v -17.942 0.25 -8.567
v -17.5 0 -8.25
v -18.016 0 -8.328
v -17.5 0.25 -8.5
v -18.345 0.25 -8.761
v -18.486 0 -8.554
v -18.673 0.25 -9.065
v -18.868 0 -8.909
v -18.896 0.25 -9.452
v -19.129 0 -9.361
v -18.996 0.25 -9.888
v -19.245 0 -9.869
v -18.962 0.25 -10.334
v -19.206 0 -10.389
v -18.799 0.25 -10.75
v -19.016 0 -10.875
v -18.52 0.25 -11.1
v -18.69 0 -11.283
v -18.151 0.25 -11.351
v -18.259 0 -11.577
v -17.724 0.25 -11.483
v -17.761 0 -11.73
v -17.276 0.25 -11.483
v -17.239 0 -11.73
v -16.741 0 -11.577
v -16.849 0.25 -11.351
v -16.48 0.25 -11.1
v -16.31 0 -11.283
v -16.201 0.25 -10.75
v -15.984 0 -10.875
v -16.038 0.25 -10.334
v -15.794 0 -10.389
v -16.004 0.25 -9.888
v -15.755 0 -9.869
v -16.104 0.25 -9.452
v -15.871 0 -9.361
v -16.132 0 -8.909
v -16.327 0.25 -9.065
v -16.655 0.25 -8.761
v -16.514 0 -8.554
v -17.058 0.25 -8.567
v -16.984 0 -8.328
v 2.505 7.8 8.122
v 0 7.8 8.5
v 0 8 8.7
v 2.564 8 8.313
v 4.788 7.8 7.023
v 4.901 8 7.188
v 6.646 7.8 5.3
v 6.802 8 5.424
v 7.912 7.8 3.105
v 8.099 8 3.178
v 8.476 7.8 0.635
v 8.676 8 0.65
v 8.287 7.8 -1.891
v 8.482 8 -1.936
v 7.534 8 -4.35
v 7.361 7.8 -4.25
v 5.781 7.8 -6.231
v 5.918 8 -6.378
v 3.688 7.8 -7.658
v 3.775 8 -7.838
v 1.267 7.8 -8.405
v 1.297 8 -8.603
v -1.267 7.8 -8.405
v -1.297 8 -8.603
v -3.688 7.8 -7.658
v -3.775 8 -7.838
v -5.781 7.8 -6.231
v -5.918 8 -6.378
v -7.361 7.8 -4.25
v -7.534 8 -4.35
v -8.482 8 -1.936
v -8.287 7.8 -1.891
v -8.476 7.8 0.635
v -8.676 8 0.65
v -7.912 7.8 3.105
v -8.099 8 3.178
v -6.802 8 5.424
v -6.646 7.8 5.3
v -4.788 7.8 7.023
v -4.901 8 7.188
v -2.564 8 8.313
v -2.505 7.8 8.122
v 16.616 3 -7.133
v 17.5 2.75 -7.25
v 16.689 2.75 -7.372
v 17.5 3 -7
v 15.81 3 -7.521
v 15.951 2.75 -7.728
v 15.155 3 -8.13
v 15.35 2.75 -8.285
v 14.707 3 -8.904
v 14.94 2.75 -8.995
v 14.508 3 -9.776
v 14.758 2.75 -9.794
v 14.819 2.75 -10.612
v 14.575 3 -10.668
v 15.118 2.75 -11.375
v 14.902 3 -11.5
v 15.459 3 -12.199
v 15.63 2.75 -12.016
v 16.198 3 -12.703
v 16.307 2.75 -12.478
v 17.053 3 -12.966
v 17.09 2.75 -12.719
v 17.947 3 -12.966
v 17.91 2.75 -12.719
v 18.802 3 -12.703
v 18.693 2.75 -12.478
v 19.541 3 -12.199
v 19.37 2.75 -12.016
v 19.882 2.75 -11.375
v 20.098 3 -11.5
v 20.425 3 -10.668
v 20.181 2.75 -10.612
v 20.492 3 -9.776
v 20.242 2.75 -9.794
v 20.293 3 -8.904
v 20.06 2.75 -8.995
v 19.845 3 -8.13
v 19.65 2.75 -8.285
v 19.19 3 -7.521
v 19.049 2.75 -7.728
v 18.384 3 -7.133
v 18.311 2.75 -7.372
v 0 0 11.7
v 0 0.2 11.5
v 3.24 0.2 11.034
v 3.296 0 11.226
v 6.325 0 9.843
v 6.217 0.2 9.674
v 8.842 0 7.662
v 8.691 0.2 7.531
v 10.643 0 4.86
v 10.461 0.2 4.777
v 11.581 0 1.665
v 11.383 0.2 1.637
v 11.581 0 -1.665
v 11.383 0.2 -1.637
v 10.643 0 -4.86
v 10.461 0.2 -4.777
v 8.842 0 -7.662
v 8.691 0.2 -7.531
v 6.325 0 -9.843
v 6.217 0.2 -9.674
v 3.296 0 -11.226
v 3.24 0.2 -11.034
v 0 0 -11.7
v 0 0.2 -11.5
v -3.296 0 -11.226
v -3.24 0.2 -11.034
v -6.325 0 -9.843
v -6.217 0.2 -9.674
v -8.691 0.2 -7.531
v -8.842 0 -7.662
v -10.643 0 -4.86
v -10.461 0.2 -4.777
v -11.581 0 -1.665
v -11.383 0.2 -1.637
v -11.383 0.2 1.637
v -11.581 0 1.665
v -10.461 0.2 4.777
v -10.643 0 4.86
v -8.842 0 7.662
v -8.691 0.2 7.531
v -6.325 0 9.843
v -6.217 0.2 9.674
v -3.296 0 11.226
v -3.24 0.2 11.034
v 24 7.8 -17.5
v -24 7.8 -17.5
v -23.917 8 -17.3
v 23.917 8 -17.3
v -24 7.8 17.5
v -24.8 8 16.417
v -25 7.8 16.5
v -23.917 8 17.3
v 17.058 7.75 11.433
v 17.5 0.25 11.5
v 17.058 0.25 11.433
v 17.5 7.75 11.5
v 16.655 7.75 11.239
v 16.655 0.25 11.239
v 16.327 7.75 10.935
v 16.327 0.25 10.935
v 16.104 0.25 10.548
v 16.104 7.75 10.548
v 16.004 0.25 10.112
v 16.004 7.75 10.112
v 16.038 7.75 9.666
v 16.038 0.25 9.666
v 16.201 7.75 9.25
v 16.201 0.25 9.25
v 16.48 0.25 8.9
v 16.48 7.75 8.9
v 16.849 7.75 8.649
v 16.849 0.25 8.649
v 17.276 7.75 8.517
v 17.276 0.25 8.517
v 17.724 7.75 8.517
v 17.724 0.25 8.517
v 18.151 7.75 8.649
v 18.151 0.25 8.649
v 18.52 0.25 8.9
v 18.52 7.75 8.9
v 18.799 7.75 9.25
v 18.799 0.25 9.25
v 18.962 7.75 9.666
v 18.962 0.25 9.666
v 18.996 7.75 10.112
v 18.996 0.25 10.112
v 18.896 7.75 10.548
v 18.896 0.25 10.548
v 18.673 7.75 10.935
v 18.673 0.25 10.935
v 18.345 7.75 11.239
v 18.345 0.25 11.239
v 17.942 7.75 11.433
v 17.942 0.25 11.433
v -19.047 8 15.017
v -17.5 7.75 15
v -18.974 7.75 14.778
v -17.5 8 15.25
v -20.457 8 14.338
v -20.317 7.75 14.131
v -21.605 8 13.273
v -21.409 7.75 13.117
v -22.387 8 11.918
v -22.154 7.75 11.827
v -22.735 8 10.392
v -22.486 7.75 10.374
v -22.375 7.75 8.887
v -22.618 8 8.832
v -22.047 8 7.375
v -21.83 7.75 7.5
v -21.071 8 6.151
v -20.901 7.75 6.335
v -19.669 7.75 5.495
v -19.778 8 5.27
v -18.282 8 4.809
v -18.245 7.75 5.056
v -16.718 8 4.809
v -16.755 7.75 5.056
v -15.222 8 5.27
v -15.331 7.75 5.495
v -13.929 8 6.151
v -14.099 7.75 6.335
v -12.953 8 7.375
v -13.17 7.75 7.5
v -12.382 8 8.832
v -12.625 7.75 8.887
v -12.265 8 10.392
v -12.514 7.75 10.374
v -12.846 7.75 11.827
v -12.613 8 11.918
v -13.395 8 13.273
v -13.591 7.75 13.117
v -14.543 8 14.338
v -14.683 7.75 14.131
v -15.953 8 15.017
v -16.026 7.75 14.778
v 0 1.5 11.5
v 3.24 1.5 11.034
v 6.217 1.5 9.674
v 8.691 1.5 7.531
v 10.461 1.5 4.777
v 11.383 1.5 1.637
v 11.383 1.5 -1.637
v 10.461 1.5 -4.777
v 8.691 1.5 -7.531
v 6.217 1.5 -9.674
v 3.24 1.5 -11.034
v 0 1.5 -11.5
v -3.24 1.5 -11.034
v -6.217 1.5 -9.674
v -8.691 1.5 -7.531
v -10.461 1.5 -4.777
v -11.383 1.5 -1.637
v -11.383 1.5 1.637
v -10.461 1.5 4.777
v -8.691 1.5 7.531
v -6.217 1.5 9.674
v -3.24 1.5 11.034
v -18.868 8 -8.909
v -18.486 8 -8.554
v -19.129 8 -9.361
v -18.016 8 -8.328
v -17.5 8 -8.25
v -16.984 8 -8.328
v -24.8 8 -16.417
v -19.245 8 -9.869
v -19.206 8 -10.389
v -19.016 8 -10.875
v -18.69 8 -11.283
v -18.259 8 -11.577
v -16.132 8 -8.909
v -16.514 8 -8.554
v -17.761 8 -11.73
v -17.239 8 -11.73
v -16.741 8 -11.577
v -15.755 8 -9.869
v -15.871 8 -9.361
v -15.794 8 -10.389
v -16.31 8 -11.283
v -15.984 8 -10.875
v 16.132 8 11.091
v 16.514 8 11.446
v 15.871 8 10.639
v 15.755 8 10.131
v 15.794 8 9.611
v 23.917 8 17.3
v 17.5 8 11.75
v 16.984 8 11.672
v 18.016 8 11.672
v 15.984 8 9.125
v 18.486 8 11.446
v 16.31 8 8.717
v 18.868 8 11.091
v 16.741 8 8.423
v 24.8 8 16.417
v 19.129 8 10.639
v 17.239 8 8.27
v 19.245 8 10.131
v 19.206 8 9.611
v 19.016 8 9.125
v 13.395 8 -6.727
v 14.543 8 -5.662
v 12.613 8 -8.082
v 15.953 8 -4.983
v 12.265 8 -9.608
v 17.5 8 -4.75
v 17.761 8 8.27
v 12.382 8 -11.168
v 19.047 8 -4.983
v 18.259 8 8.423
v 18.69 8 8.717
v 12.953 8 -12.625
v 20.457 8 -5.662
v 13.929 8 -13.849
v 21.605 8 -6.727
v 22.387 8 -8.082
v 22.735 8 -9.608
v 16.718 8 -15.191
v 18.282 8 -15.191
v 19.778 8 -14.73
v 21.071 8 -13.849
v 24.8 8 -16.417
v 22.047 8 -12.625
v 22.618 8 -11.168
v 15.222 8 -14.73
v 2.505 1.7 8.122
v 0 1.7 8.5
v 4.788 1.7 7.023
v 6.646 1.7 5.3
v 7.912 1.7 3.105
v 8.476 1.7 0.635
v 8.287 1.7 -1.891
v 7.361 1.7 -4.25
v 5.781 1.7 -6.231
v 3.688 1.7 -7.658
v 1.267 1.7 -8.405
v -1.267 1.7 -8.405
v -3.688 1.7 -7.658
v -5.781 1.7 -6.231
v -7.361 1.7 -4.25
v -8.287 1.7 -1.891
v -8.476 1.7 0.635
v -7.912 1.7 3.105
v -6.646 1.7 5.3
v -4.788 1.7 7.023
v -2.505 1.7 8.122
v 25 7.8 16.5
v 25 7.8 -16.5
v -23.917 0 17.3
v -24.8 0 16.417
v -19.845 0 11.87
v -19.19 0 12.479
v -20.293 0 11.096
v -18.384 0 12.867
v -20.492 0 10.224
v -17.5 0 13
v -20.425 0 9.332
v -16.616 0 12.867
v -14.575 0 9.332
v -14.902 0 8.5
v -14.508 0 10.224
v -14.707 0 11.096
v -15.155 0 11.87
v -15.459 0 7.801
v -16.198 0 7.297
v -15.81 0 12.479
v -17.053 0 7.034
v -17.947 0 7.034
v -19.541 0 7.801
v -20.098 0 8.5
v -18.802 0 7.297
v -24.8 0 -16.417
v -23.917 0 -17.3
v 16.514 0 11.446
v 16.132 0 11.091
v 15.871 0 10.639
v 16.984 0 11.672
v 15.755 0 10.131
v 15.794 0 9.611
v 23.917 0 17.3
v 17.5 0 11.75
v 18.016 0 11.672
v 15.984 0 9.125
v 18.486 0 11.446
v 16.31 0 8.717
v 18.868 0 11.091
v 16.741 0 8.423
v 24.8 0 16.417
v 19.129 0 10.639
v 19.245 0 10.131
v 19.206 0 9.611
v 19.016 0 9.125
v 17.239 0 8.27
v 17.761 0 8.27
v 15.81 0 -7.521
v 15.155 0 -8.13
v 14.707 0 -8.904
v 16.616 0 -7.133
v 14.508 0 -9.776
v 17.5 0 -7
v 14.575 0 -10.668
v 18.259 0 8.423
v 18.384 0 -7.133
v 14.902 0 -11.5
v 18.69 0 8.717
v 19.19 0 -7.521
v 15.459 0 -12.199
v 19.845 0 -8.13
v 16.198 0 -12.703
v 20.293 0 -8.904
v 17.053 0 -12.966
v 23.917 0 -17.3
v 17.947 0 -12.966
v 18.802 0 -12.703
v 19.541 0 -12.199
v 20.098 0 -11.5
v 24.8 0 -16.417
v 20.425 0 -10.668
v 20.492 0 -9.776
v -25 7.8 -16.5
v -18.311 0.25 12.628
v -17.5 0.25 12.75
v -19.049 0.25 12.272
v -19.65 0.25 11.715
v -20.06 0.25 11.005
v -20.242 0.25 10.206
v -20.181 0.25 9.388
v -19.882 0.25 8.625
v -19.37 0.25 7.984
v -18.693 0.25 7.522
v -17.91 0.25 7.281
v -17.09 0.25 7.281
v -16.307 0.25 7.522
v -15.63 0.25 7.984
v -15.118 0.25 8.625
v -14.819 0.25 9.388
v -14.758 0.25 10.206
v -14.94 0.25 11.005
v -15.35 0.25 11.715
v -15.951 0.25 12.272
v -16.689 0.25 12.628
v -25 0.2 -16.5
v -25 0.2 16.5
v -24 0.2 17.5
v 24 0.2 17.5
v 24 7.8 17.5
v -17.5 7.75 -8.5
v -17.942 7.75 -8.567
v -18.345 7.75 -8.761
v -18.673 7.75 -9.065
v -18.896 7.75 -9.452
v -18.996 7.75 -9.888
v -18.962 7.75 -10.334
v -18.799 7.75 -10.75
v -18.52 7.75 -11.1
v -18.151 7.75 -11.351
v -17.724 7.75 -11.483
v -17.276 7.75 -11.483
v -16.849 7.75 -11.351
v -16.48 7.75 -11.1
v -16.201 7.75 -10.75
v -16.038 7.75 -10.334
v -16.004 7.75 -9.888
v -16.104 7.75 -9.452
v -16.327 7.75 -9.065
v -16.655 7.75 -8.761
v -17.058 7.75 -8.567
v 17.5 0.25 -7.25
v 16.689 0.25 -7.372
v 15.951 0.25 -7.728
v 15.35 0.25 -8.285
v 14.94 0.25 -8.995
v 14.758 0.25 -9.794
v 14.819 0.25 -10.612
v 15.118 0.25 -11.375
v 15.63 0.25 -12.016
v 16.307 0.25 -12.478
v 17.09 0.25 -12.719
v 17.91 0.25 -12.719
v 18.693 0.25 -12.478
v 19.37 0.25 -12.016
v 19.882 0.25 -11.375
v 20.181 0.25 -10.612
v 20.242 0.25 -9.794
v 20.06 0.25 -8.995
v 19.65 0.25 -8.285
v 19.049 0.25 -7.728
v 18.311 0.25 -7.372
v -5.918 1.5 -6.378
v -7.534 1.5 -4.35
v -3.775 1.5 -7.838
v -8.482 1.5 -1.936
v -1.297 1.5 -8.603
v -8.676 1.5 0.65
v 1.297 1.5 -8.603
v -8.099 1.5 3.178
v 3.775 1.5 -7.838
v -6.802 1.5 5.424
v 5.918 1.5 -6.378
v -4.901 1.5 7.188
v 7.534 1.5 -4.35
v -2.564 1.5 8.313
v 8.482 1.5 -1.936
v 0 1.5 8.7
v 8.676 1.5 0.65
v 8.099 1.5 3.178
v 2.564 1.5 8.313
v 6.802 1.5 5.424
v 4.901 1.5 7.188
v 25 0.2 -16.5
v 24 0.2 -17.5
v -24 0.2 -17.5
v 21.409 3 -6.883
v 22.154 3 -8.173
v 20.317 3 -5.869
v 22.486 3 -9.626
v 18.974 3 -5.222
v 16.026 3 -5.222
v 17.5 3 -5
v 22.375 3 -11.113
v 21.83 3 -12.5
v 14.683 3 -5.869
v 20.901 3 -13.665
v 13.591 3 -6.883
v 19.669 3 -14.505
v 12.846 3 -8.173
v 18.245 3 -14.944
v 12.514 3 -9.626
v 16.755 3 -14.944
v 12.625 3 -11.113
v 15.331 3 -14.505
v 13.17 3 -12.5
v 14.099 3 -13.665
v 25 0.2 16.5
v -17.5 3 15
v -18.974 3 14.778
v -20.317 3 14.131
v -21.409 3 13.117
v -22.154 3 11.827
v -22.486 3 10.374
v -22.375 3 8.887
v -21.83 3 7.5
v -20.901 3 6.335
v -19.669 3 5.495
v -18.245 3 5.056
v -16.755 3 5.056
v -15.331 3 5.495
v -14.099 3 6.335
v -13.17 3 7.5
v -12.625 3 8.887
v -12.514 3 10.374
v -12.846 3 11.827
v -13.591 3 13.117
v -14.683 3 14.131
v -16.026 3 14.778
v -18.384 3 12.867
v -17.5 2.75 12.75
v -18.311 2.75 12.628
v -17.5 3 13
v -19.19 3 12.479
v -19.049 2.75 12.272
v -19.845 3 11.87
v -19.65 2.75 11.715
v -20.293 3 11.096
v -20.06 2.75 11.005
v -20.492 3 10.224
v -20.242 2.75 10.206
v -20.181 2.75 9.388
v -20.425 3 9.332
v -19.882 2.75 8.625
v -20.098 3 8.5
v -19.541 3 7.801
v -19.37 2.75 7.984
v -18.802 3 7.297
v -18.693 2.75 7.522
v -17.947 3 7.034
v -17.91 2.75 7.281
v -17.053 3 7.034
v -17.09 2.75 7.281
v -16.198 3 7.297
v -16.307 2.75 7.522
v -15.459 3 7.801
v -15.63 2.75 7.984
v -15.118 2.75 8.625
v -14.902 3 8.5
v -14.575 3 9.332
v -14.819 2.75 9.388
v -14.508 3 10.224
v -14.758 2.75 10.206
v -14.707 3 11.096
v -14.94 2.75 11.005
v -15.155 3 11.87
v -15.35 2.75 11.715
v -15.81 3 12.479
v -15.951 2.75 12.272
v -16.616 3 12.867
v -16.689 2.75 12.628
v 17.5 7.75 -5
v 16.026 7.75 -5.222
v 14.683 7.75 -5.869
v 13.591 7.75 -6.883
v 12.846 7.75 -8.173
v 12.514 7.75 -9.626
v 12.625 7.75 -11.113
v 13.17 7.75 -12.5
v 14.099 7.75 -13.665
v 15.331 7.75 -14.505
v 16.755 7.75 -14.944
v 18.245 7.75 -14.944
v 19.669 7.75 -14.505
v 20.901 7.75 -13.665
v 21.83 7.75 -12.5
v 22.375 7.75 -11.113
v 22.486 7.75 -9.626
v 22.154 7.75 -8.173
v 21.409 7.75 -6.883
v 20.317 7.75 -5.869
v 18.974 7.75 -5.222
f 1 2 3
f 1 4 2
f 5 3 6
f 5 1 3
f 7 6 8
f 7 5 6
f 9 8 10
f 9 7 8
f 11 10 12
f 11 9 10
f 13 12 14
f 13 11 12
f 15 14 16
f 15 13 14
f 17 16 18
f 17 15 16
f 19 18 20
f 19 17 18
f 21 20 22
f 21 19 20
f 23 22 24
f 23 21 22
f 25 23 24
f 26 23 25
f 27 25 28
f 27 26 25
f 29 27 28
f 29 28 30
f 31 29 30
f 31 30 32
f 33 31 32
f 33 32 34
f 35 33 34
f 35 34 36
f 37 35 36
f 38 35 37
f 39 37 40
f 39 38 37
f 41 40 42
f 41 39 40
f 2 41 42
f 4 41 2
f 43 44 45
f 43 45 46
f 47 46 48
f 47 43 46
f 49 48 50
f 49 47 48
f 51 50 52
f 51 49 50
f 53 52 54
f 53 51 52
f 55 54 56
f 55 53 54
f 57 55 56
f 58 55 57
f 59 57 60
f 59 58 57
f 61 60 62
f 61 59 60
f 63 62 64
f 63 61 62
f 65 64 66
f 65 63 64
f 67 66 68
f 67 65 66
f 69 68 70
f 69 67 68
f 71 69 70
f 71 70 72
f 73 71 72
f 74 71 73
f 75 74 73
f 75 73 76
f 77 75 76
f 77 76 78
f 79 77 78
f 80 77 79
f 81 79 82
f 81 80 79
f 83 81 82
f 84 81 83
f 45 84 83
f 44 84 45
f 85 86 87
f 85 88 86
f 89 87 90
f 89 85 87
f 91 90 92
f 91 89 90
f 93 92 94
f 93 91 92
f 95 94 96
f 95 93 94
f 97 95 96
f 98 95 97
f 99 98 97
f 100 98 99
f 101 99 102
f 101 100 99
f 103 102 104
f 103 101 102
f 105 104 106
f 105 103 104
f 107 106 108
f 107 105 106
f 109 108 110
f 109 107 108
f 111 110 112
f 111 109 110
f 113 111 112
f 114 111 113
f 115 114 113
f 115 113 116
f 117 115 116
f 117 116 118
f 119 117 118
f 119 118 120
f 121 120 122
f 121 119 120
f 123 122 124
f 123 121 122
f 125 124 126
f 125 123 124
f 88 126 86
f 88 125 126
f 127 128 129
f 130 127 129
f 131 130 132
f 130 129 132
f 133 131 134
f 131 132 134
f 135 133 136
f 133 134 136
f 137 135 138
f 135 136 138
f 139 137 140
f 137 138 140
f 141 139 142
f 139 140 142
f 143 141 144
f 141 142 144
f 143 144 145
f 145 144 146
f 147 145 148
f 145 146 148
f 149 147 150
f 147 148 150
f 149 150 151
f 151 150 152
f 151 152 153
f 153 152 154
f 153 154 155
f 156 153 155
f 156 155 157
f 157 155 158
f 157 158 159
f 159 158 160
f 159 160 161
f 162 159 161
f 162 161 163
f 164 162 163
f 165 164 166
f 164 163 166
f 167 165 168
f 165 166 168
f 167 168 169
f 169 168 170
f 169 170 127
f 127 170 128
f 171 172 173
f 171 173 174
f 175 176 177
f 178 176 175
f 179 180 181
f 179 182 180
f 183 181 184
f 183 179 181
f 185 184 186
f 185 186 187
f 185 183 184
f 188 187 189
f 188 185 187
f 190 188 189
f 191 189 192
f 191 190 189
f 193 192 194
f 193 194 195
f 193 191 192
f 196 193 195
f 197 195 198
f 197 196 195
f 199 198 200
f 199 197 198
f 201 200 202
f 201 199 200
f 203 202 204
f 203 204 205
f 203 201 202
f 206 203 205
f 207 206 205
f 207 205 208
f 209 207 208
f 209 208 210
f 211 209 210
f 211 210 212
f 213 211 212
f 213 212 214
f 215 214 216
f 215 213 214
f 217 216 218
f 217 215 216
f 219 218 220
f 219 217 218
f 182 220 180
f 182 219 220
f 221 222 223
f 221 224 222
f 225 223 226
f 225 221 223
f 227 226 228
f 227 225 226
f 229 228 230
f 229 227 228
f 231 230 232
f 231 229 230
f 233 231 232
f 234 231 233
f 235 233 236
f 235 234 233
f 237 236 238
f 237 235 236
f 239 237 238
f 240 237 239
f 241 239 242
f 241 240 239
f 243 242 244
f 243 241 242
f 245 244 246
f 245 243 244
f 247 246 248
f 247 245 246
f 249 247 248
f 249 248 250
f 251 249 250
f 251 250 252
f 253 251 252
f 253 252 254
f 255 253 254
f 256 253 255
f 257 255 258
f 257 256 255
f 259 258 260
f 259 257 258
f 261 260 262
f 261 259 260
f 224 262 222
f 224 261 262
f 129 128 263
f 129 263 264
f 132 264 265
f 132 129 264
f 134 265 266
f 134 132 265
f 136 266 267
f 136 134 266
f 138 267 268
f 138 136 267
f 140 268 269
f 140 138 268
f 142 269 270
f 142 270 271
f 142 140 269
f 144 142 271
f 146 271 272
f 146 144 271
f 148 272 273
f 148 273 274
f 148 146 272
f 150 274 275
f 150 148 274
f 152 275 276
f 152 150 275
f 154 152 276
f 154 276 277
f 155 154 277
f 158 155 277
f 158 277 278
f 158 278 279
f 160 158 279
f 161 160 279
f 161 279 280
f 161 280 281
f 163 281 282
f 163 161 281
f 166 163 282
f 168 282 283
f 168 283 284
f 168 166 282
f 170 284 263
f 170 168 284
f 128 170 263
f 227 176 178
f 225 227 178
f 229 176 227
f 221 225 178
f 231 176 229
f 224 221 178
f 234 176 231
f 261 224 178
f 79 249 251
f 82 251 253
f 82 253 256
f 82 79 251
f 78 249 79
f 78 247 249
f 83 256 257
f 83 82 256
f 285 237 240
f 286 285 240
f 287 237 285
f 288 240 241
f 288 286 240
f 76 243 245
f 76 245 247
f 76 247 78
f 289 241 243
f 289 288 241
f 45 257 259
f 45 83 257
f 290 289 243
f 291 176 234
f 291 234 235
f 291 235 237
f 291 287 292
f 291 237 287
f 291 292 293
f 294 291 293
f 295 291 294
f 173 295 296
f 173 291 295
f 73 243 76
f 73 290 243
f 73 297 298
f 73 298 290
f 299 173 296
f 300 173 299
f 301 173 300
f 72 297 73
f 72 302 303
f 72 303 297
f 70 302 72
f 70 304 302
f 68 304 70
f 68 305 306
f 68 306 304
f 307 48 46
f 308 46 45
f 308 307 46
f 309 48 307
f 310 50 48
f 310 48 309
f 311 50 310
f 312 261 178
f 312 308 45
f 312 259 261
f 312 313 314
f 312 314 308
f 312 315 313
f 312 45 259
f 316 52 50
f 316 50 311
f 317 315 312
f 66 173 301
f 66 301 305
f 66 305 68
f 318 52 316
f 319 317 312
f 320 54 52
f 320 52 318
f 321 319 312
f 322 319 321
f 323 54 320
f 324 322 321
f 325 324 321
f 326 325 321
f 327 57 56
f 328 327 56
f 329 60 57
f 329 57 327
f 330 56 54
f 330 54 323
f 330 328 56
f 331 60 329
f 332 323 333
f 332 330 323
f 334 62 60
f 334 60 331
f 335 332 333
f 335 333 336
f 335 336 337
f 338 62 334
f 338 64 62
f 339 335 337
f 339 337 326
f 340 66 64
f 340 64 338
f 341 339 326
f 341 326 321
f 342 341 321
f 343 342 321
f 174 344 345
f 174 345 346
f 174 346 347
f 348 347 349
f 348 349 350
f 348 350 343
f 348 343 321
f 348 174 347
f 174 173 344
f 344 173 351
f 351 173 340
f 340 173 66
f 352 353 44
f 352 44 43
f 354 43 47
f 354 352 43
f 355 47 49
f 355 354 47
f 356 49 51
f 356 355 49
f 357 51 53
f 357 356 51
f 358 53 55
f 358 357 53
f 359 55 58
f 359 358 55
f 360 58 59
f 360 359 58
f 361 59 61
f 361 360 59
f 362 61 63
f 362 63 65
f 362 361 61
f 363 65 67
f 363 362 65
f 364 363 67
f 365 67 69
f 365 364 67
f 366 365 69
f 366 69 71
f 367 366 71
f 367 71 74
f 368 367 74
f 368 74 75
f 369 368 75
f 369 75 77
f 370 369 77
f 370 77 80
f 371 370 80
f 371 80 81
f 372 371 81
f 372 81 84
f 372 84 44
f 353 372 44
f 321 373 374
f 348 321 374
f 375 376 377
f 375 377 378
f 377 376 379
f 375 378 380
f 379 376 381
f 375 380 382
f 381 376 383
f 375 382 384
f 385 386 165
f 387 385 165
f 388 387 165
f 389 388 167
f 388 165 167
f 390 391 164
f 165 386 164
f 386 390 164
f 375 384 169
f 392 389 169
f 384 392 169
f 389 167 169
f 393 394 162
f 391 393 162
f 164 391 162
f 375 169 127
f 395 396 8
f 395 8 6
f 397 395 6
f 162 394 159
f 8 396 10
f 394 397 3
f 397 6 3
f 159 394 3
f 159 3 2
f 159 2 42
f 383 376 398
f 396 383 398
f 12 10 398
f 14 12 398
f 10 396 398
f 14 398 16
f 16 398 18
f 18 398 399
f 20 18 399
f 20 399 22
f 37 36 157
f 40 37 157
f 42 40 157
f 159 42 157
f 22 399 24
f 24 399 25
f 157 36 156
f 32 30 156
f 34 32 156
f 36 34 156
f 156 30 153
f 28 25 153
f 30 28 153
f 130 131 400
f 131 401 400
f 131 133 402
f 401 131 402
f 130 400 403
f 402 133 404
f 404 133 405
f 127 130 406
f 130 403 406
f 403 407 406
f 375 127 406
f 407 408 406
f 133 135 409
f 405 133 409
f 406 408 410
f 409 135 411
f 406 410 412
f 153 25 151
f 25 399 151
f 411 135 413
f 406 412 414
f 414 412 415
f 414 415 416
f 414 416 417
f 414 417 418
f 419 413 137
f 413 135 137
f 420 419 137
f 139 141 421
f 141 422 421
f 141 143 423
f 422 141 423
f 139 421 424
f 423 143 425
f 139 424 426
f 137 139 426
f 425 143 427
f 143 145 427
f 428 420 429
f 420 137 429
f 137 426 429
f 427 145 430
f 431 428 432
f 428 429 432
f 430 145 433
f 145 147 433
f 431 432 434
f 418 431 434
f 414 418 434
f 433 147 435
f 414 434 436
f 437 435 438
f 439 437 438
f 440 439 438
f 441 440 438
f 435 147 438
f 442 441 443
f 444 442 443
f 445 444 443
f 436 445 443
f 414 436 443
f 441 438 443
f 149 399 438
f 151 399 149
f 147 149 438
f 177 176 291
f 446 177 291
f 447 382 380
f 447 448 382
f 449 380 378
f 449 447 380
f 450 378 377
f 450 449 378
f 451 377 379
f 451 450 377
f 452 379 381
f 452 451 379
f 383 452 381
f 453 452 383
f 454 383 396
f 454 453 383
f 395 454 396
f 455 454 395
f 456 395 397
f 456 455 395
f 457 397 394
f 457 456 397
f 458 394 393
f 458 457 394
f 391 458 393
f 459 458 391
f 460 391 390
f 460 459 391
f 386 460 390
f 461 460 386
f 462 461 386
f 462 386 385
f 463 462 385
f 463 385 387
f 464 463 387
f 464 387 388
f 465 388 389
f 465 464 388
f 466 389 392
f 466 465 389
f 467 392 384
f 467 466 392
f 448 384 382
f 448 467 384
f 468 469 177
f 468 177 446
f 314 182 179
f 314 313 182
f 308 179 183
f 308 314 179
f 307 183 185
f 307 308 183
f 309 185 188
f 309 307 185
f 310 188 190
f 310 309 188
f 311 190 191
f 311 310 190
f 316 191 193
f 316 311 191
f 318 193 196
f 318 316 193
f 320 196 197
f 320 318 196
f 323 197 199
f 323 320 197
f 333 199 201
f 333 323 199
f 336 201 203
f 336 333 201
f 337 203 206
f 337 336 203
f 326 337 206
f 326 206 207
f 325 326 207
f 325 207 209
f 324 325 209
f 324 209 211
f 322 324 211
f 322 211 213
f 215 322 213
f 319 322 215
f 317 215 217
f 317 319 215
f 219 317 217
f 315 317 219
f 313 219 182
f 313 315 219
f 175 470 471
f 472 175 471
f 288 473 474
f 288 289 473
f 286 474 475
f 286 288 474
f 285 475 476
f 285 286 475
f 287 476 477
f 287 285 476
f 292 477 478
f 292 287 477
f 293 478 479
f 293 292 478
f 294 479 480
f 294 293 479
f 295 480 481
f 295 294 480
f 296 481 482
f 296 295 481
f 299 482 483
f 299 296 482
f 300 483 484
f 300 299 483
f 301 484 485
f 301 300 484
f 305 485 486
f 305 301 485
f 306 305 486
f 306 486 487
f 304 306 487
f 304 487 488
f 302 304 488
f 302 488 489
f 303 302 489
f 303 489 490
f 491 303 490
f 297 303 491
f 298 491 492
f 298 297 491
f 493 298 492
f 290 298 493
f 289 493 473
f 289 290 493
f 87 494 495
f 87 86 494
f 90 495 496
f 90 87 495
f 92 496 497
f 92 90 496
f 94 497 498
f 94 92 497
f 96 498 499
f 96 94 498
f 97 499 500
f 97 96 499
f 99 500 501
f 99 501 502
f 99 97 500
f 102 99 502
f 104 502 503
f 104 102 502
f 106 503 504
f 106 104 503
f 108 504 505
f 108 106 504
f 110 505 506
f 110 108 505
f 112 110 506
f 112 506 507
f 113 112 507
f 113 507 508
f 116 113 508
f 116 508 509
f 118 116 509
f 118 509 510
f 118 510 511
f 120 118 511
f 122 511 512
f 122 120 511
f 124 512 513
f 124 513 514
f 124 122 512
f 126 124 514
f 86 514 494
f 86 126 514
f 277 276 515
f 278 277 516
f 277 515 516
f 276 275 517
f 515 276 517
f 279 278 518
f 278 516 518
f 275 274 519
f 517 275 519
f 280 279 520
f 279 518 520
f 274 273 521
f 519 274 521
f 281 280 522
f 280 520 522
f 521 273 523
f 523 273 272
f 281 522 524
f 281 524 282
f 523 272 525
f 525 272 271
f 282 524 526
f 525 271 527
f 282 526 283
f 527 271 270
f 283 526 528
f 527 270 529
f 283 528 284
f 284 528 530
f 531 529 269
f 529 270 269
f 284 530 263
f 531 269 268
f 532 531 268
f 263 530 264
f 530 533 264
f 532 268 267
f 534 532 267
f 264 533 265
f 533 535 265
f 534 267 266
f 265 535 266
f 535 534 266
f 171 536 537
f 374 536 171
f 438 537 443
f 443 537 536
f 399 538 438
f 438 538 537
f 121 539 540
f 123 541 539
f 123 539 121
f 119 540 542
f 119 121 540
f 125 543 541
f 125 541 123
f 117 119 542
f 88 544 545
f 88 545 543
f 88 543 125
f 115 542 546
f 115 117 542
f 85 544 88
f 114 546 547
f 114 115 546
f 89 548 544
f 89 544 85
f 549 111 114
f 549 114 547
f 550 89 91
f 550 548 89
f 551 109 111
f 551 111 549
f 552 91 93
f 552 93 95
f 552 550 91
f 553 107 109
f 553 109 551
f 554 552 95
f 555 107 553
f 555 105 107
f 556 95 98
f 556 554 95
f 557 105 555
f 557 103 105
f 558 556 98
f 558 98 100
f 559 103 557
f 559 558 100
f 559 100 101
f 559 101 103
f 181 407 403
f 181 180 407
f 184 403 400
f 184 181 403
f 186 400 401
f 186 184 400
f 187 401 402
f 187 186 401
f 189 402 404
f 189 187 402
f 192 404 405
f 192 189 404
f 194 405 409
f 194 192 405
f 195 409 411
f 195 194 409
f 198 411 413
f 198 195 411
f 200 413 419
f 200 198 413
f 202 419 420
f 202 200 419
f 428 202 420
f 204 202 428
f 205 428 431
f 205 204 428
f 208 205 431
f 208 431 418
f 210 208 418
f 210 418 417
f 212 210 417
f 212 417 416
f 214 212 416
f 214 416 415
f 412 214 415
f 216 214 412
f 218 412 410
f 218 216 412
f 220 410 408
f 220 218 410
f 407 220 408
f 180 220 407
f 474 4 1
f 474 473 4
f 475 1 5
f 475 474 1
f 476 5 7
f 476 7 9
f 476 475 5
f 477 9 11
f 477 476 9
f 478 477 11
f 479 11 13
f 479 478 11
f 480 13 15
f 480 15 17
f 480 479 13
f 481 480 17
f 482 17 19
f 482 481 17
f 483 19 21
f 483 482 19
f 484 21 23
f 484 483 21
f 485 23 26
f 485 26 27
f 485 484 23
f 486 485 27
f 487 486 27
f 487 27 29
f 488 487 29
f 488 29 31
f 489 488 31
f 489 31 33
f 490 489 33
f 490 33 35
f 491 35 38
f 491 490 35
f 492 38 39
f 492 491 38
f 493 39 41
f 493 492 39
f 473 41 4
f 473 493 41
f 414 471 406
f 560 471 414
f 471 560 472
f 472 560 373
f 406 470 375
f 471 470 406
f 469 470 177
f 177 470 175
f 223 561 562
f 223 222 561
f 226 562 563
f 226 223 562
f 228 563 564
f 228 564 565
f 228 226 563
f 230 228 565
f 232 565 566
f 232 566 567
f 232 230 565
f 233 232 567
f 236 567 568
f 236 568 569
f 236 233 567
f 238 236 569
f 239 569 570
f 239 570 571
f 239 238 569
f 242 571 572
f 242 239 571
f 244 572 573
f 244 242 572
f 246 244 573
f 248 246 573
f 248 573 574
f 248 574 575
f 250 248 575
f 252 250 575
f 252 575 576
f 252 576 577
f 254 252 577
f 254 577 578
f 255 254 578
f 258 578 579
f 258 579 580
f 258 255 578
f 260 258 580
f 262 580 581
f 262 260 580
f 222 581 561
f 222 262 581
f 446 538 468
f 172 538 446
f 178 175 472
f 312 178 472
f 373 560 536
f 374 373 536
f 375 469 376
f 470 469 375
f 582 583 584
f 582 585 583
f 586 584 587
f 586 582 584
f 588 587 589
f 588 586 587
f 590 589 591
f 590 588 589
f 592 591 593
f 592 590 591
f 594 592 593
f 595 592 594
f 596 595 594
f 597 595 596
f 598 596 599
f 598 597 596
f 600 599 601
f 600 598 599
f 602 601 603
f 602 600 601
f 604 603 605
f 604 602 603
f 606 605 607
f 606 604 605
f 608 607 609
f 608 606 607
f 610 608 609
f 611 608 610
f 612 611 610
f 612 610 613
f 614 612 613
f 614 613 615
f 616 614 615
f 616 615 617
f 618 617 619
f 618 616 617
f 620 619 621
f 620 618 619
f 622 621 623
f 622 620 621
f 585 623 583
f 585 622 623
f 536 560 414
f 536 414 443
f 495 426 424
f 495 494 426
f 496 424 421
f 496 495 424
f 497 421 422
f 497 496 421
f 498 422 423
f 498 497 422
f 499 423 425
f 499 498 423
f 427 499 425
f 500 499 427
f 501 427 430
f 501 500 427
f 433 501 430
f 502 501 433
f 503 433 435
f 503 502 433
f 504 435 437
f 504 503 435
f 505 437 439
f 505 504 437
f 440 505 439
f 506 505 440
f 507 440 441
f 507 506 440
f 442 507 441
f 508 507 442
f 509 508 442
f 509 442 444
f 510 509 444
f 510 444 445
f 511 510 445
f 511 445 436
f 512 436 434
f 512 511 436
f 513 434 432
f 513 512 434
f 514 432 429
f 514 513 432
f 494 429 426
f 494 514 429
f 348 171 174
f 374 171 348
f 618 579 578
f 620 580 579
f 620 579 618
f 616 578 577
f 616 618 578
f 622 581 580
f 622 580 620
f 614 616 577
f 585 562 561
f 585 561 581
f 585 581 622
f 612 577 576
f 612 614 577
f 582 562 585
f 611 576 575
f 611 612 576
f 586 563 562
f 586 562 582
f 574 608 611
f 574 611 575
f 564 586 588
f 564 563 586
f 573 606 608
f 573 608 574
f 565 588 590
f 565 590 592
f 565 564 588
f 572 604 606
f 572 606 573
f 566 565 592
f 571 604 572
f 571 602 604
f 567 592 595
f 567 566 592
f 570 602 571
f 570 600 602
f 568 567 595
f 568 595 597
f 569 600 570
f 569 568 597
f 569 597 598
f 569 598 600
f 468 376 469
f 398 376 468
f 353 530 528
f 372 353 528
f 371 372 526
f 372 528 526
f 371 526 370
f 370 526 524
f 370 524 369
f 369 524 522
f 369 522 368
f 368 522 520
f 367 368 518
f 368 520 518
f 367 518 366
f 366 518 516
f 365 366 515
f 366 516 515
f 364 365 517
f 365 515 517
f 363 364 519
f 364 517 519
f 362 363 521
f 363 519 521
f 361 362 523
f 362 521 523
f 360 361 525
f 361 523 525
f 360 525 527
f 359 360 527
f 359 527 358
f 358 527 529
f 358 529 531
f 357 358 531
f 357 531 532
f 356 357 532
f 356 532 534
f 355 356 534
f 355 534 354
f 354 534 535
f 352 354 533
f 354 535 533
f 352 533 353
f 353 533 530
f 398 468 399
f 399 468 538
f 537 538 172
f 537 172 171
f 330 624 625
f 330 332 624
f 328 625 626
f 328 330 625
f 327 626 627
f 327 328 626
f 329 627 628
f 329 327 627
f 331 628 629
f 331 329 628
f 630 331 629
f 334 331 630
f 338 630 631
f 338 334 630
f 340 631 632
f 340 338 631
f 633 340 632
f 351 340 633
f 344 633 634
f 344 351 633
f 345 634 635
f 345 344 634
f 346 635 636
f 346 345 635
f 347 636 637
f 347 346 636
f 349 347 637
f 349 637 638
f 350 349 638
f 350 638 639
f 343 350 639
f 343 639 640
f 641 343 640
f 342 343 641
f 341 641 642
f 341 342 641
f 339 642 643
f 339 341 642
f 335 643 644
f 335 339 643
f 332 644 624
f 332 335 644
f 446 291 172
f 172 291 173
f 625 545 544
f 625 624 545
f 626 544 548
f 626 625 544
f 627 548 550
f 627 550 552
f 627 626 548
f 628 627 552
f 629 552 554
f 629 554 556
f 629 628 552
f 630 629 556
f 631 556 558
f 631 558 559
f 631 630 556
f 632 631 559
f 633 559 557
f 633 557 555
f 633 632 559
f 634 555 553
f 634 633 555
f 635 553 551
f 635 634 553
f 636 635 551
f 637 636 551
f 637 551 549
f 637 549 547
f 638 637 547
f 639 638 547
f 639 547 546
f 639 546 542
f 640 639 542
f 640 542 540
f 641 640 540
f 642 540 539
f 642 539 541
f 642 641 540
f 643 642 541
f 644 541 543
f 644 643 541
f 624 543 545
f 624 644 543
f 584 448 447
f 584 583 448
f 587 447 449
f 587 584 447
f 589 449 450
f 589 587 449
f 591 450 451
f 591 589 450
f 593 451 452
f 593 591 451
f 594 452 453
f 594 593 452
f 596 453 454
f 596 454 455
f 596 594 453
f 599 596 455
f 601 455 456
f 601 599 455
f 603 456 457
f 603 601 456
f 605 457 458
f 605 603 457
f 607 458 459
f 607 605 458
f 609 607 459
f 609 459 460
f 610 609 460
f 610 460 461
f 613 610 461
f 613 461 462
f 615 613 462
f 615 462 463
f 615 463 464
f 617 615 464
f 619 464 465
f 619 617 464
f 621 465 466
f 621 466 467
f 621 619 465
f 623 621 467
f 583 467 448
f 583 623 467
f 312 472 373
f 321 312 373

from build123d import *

# Parameters (mm, degrees)
SKETCH1_W                      = 50
SKETCH1_H                      = 35
SKETCH1_R                      = 8.5
BOSS_EXTRUDE1_DEPTH            = 8
F_3_0MM_DOWEL_HOLE1_AT_2_COUNT = 2
F_3_0MM_DOWEL_HOLE1_AT_2_PITCH = 40.311288741
CBORE_FOR_M5_SHCS1_AT_2_COUNT  = 2
CBORE_FOR_M5_SHCS1_AT_2_PITCH  = 40.311288741
SKETCH6_R                      = 11.5
CUT_EXTRUDE1_DEPTH             = 1.5
CHAMFER1_SIZE                  = 1
CHAMFER2_SIZE                  = 0.2


with BuildPart() as part:
    # Sketch1 → Boss-Extrude1 (new body)
    with BuildSketch(Plane(origin=(0, 0, 0), x_dir=(1, 0, 0), z_dir=(0, 1, 0))):
        Rectangle(SKETCH1_W, SKETCH1_H)
        with Locations(Location((0, 0, 0), (0, 0, 270))):
            Circle(SKETCH1_R, mode=Mode.SUBTRACT)
    extrude(amount=BOSS_EXTRUDE1_DEPTH)

    # Sketch3 → Ø3.0mm Dowel Hole1 (revolve, cut)
    with BuildSketch(Plane(origin=(-17.5, 8, -10), x_dir=(0, 0, 1), z_dir=(1, 0, 0))):
        Polygon((0, 0), (0, 8), (1.75, 8), (1.5, 7.75), (1.5, 0.25), (1.75, 0), align=None)
    f_3_0mm_dowel_hole1 = revolve(axis=Axis((-17.5, 14.35, -10), (0, -1, 0)), mode=Mode.SUBTRACT)

    # Ø3.0mm Dowel Hole1 at 2: Ø3.0mm Dowel Hole1 ×2
    with Locations(*[Vector(0.8682431421244593, 0, 0.49613893835683387) * (i * F_3_0MM_DOWEL_HOLE1_AT_2_PITCH) for i in range(1, F_3_0MM_DOWEL_HOLE1_AT_2_COUNT)]):
        add(f_3_0mm_dowel_hole1, mode=Mode.SUBTRACT)

    # Sketch5 → CBORE for M5 SHCS1 (revolve, cut)
    with BuildSketch(Plane(origin=(17.5, 8, -10), x_dir=(0, 0, 1), z_dir=(1, 0, 0))):
        Polygon((0, 0), (0, 8), (3, 8), (2.75, 7.75), (2.75, 5.25), (3, 5), (5, 5), (5, 0.25), (5.25, 0), align=None)
    cbore_for_m5_shcs1 = revolve(axis=Axis((17.5, 14.35, -10), (0, -1, 0)), mode=Mode.SUBTRACT)

    # CBORE for M5 SHCS1 at 2: CBORE for M5 SHCS1 ×2
    with Locations(*[Vector(-0.8682431421244593, 0, 0.49613893835683387) * (i * CBORE_FOR_M5_SHCS1_AT_2_PITCH) for i in range(1, CBORE_FOR_M5_SHCS1_AT_2_COUNT)]):
        add(cbore_for_m5_shcs1, mode=Mode.SUBTRACT)

    # Sketch6 → Cut-Extrude1 (cut)
    with BuildSketch(Plane(origin=(0, 0, 0), x_dir=(1, 0, 0), z_dir=(0, 1, 0))):
        with Locations(Location((0, 0, 0), (0, 0, 270))):
            Circle(SKETCH6_R)
    extrude(amount=CUT_EXTRUDE1_DEPTH, mode=Mode.SUBTRACT)

    # Chamfer1
    chamfer1_edges = [part.edges().sort_by_distance(p)[0] for p in [
        (-25, 4, -17.5),
        (25, 4, -17.5),
        (25, 4, 17.5),
        (-25, 4, 17.5),
    ]]
    chamfer(chamfer1_edges, length=CHAMFER1_SIZE)

    # Chamfer2
    chamfer2_edges = [part.edges().sort_by_distance(p)[0] for p in [
        (0, 8, -8.5),
        (0, 1.5, -8.5),
        (0, 0, -11.5),
        (0, 0, -17.5),
        (0, 8, -17.5),
        (-25, 0, 0),
        (25, 0, 0),
        (0, 0, 17.5),
        (-24.5, 0, 17),
        (-24.5, 0, -17),
        (24.5, 0, 17),
        (24.5, 0, -17),
        (25, 8, 0),
        (-25, 8, 0),
        (0, 8, 17.5),
        (-24.5, 8, 17),
        (-24.5, 8, -17),
        (24.5, 8, 17),
        (24.5, 8, -17),
    ]]
    chamfer(chamfer2_edges, length=CHAMFER2_SIZE)


solid = part.part
